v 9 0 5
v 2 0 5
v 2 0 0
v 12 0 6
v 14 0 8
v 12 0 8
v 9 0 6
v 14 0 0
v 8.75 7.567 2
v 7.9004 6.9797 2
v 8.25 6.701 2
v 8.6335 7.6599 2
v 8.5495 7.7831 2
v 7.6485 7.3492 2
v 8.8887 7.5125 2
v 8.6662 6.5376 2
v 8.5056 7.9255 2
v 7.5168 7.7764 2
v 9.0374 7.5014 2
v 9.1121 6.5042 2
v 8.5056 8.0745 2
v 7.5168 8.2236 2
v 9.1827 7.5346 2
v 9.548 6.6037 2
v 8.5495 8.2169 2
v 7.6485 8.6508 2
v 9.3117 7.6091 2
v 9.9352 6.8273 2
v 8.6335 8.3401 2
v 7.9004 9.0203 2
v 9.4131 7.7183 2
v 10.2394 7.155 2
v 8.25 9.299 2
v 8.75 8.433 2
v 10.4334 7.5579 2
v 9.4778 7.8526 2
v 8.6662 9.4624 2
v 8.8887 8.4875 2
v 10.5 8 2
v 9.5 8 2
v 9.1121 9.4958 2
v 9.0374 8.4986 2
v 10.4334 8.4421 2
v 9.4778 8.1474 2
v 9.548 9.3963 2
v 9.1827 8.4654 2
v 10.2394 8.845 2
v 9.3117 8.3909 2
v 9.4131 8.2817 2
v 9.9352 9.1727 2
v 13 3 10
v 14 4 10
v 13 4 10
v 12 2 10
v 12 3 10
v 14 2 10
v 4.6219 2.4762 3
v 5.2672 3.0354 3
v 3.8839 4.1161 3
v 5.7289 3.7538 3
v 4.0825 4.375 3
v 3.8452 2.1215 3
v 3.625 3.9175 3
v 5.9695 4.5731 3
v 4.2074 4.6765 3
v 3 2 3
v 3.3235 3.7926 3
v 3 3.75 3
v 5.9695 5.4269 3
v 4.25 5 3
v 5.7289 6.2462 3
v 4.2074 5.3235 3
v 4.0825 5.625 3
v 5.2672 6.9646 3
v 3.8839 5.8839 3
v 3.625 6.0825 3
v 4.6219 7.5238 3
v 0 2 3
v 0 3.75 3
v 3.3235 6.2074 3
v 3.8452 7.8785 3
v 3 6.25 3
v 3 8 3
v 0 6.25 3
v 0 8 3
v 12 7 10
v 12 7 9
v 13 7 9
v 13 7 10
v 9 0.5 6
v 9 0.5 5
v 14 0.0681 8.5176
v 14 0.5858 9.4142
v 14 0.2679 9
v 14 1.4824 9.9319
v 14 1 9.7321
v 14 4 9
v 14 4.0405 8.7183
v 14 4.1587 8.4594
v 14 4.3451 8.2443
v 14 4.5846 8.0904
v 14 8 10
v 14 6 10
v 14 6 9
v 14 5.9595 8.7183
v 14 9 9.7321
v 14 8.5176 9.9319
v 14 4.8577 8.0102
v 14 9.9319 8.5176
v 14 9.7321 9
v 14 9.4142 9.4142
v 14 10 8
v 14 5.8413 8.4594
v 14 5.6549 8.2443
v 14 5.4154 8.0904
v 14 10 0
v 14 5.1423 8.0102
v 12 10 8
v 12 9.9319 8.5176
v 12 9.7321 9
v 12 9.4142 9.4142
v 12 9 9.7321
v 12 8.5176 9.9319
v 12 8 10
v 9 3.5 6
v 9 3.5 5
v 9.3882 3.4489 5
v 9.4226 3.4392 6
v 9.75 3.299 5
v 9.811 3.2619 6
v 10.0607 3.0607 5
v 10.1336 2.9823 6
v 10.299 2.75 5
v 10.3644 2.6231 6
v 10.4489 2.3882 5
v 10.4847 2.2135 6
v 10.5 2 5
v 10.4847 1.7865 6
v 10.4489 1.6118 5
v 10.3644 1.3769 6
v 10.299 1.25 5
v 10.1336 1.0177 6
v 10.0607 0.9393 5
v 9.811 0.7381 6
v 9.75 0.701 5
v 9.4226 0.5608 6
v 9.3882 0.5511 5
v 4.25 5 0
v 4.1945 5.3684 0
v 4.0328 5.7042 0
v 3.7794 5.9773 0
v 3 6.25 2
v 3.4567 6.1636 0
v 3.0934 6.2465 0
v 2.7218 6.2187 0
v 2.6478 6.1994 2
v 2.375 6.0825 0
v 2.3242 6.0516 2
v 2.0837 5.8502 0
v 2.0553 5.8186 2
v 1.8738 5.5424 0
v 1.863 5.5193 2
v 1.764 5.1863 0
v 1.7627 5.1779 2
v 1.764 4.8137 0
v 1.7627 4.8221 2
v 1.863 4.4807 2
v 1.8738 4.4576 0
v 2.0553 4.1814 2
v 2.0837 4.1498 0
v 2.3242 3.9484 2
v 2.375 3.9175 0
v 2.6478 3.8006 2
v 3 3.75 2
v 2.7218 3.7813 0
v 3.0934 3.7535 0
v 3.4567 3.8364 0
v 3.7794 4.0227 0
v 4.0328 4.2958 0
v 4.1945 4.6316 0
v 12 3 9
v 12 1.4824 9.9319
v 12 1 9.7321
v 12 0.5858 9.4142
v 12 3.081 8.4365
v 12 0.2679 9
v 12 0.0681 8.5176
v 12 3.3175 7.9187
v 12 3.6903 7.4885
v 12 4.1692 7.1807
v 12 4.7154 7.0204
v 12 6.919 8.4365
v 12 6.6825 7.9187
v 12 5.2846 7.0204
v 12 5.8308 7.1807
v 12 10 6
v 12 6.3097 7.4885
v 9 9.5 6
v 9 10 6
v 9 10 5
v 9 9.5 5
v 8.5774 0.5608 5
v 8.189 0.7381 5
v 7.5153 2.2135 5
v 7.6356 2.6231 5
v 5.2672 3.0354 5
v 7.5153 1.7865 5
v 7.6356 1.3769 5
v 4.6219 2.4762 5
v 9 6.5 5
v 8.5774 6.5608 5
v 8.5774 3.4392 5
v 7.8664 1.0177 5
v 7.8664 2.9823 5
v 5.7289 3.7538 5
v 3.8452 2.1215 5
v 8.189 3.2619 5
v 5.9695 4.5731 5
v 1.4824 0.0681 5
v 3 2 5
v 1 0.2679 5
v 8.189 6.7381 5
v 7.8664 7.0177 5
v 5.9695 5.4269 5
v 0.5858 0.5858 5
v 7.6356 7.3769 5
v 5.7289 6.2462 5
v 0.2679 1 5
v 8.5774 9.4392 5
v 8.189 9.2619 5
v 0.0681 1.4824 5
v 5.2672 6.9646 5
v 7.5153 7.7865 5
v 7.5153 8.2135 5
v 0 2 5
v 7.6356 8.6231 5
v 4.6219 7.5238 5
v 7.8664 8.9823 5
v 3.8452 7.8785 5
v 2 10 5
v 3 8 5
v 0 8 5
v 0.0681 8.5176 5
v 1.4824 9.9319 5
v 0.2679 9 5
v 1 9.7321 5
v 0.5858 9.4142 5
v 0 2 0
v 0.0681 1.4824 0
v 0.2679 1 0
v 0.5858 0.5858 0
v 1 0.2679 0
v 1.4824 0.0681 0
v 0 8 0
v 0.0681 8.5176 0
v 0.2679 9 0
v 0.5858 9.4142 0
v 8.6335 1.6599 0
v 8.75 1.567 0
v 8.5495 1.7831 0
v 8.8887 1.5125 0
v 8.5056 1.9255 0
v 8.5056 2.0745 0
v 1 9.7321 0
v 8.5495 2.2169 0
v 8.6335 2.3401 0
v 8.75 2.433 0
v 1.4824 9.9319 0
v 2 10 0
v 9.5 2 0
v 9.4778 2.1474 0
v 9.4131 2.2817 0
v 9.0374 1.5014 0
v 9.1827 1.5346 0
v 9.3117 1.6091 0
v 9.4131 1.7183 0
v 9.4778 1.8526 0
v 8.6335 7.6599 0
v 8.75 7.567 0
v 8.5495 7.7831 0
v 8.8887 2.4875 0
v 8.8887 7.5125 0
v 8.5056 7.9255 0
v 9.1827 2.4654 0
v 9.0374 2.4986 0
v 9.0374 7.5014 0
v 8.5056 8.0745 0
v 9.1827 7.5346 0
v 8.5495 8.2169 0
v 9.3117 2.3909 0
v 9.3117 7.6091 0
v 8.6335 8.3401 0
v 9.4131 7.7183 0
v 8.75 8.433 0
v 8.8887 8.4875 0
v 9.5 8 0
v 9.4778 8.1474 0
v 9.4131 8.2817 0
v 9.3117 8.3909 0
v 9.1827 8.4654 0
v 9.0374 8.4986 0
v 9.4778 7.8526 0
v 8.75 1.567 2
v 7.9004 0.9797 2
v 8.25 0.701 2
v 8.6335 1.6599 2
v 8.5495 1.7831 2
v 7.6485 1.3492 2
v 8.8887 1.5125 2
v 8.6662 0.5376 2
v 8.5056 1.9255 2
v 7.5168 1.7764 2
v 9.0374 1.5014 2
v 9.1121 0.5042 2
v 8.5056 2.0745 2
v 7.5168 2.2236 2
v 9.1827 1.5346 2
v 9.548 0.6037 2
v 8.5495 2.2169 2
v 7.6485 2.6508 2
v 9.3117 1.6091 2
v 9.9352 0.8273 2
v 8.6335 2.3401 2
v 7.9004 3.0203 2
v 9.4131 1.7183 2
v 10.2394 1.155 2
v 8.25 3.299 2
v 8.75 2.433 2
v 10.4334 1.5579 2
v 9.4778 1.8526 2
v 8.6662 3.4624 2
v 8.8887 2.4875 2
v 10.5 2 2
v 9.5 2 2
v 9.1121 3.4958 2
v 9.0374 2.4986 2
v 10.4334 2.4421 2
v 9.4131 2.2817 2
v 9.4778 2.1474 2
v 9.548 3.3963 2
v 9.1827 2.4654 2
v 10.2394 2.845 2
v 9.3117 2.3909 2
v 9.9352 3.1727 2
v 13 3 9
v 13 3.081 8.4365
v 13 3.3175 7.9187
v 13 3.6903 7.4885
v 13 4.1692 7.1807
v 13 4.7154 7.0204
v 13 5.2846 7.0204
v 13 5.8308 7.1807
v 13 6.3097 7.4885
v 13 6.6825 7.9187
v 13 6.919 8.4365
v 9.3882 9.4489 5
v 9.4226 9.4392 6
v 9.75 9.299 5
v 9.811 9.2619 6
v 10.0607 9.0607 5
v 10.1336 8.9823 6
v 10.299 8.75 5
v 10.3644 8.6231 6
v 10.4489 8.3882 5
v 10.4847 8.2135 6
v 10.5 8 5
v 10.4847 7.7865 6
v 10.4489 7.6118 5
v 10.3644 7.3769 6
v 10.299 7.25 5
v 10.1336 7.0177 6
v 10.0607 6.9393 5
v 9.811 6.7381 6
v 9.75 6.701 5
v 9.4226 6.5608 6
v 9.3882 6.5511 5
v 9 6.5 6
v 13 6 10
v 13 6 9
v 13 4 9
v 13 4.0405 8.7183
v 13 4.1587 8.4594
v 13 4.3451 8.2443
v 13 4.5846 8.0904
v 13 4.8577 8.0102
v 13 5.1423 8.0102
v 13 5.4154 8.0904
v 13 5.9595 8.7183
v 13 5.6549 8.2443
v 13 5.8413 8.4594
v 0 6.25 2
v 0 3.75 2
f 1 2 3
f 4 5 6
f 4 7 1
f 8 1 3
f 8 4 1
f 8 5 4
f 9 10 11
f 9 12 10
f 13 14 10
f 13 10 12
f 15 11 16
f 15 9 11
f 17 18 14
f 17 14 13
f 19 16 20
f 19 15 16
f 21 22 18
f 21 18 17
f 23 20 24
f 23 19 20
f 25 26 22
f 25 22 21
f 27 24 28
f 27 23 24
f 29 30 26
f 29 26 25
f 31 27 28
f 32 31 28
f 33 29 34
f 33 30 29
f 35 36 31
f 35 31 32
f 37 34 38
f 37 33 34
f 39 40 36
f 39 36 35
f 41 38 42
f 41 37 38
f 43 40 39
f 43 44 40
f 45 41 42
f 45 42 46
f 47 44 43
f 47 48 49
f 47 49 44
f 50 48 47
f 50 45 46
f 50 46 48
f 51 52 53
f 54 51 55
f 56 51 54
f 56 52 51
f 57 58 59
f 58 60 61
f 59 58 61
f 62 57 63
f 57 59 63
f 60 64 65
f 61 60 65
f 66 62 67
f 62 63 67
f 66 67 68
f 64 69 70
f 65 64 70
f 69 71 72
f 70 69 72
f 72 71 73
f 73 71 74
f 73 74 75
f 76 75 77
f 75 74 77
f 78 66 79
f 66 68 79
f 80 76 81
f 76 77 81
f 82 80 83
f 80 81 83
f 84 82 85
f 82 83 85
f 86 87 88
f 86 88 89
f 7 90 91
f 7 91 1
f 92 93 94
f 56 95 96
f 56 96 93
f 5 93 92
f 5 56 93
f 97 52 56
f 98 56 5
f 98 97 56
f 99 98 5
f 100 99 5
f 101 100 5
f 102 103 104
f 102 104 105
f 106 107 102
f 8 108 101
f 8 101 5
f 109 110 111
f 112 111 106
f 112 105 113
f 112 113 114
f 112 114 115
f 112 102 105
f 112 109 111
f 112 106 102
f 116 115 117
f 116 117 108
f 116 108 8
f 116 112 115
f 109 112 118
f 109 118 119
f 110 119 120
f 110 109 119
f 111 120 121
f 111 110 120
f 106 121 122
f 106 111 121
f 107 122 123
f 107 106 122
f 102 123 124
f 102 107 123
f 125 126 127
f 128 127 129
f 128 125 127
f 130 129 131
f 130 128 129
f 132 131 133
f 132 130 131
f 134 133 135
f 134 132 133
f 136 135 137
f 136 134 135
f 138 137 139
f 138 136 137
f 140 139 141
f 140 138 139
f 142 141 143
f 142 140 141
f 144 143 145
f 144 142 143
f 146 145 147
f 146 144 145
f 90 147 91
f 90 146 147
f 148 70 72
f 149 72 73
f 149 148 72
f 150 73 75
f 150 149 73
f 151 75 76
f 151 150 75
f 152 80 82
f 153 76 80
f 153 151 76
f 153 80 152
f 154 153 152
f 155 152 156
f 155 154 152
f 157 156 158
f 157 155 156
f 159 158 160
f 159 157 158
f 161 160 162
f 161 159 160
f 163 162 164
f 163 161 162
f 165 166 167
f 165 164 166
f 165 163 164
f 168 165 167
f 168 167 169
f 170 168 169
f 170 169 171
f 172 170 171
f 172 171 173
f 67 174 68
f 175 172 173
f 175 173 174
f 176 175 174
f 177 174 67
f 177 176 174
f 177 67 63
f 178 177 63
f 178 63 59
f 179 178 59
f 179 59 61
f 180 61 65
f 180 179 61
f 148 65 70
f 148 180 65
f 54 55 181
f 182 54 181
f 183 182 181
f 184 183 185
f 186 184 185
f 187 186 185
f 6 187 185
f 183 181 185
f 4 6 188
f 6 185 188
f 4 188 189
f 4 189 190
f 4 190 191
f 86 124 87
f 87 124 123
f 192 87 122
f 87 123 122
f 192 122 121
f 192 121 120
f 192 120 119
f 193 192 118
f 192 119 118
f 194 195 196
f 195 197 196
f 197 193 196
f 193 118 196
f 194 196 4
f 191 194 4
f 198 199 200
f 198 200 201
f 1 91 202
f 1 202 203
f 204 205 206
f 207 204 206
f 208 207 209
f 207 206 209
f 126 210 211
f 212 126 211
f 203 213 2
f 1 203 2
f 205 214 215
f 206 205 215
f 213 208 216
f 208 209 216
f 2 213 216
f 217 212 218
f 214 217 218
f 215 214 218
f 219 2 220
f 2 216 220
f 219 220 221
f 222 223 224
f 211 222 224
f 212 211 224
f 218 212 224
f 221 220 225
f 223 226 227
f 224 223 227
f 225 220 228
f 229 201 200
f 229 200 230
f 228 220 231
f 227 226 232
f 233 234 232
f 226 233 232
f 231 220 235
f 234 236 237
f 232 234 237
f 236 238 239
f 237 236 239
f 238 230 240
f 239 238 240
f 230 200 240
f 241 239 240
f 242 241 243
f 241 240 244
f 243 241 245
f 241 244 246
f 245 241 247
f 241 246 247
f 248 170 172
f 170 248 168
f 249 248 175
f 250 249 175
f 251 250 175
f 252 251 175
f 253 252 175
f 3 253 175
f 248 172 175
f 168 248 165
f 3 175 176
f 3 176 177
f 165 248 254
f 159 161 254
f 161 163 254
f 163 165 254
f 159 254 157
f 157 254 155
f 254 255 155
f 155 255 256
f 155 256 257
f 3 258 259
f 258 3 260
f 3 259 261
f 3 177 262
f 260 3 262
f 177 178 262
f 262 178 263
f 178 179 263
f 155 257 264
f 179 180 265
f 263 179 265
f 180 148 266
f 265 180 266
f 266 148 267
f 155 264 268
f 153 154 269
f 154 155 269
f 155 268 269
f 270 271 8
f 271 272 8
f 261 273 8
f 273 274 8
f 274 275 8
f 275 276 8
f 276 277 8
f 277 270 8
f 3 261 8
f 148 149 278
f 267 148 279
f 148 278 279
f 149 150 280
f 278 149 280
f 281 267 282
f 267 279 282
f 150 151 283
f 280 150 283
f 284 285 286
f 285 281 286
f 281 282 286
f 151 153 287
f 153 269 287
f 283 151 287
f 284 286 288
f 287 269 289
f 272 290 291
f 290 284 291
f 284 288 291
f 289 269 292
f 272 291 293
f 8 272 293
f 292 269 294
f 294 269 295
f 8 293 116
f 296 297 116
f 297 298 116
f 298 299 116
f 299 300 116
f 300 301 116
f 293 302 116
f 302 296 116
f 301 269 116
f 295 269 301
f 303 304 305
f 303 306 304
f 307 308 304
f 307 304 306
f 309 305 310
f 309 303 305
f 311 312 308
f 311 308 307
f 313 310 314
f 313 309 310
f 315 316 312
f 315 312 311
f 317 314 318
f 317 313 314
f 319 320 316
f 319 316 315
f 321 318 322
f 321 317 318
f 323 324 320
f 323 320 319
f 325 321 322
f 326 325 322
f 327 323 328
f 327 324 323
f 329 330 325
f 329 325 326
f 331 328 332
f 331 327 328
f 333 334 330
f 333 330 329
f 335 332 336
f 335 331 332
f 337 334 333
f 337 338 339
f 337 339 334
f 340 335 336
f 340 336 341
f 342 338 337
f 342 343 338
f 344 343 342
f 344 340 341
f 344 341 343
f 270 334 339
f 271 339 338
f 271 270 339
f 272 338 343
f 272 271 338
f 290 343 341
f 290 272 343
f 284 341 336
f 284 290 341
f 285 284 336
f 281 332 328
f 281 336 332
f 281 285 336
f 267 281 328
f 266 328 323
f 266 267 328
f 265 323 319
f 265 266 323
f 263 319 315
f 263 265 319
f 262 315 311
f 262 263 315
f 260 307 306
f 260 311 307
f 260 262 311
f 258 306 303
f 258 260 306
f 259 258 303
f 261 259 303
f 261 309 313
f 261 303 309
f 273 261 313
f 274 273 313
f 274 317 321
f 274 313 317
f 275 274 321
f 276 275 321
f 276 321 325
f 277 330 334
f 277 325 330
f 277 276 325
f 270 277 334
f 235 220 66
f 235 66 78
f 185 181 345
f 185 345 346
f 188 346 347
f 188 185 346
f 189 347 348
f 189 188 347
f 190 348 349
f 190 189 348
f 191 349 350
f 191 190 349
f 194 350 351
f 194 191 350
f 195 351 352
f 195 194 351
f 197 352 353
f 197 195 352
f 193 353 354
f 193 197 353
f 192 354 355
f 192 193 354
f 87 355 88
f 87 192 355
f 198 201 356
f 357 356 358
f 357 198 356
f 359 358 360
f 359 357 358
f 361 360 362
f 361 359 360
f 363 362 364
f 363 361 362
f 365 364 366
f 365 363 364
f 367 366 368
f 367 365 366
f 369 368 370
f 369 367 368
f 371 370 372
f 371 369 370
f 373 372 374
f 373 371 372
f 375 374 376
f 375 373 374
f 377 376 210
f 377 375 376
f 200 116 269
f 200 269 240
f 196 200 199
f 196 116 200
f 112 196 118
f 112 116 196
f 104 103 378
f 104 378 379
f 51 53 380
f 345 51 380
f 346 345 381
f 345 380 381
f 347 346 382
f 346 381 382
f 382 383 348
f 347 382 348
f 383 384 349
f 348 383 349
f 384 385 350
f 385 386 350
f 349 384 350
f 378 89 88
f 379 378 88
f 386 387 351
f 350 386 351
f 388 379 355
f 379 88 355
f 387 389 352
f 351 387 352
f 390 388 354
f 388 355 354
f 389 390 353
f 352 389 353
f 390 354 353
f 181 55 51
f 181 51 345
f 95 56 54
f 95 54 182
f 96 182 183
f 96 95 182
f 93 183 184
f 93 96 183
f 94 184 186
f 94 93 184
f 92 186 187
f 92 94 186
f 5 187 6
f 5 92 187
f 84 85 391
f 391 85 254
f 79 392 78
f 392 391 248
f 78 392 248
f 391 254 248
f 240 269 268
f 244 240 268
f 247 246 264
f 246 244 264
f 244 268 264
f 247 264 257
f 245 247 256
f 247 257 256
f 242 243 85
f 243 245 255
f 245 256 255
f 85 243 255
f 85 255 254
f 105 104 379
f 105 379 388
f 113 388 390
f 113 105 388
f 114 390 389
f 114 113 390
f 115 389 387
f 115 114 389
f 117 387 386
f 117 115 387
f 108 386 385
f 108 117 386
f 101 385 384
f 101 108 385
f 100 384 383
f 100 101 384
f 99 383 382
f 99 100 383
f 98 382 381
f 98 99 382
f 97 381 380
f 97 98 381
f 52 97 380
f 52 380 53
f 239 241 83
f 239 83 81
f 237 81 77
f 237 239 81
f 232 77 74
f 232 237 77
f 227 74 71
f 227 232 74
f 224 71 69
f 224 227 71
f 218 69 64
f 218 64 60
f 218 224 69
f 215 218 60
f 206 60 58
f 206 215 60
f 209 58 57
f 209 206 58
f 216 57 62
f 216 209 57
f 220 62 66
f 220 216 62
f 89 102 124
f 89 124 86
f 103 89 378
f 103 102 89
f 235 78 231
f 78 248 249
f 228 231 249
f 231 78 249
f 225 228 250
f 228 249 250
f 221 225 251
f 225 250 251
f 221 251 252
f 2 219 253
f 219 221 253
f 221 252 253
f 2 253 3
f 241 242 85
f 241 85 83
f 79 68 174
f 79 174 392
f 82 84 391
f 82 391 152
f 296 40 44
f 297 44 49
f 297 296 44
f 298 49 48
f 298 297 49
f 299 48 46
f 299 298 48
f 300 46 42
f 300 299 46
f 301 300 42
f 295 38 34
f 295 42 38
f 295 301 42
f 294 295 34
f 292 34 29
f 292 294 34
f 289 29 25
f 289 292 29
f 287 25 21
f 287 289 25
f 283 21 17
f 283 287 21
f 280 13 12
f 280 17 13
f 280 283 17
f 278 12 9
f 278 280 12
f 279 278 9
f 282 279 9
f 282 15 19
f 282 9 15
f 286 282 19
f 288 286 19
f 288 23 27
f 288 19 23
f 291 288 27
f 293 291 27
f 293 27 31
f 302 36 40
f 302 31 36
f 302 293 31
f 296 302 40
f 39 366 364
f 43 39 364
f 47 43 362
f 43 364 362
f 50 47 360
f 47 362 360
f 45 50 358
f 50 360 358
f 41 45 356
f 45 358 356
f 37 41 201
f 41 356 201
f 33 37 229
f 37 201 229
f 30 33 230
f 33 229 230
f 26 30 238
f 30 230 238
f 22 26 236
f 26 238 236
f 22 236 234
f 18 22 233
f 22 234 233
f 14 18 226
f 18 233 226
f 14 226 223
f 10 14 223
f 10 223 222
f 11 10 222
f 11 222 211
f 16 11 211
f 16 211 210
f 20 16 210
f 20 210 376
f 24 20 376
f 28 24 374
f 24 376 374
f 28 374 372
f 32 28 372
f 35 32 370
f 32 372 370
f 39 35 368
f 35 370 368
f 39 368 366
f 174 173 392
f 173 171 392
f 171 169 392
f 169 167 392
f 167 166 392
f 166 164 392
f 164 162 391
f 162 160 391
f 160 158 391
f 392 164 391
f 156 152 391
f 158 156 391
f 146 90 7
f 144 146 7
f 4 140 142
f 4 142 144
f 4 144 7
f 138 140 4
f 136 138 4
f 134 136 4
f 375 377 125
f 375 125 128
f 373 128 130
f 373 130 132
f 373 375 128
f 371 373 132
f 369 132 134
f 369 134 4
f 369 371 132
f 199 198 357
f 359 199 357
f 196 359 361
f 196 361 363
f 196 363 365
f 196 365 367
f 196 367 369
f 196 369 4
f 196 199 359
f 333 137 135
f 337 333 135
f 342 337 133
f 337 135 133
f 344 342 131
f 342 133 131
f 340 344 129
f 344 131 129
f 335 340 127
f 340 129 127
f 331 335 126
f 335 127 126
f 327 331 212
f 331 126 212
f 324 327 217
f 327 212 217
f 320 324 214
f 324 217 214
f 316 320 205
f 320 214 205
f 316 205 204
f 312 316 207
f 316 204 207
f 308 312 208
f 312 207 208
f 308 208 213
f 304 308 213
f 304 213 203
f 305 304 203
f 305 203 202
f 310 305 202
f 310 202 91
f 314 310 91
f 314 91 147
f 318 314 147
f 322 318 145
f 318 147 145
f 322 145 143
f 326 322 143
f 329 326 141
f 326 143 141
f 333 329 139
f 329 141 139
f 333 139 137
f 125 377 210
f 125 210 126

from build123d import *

# Parameters (mm, degrees)
SKETCH1_R           = 1.25
SKETCH1_R_2         = 0.5
BOSS_EXTRUDE1_DEPTH = 6
BOSS_EXTRUDE2_DEPTH = 2
CUT_EXTRUDE1_DEPTH  = 1
CUT_EXTRUDE2_DEPTH  = 1
CUT_EXTRUDE3_DEPTH  = 2
CUT_EXTRUDE4_DEPTH  = 1
SKETCH9_R           = 1.5
CUT_EXTRUDE5_DEPTH  = 3


with BuildPart() as part:
    # Sketch1 → Boss-Extrude1 (new body)
    with BuildSketch(Plane.XY):
        with BuildLine():
            Line((2, 0), (14, 0))
            Line((14, 0), (14, 10))
            Line((14, 10), (2, 10))
            ThreePointArc((2, 10), (0.585786438, 9.414213562), (0, 8))
            Line((0, 8), (0, 2))
            ThreePointArc((0, 2), (0.585786438, 0.585786438), (2, 0))
        make_face()
        with Locations((3, 5)):
            Circle(SKETCH1_R, mode=Mode.SUBTRACT)
        with Locations((9, 8)):
            Circle(SKETCH1_R_2, mode=Mode.SUBTRACT)
        with Locations((9, 2)):
            Circle(SKETCH1_R_2, mode=Mode.SUBTRACT)
    extrude(amount=BOSS_EXTRUDE1_DEPTH)

    # Sketch2 → Boss-Extrude2 (add)
    with BuildSketch(Plane(origin=(14, 0, 0), x_dir=(0, 0, -1), z_dir=(1, 0, 0))):
        with BuildLine():
            Line((-6, 0), (-6, 10))
            Line((-6, 10), (-8, 10))
            ThreePointArc((-8, 10), (-9.414213562, 9.414213562), (-10, 8))
            Line((-10, 8), (-10, 7))
            Line((-10, 7), (-9, 7))
            ThreePointArc((-9, 7), (-7, 5), (-9, 3))
            Line((-9, 3), (-10, 3))
            Line((-10, 3), (-10, 2))
            ThreePointArc((-10, 2), (-9.414213562, 0.585786438), (-8, 0))
            Line((-8, 0), (-6, 0))
        make_face()
        with BuildLine():
            Line((-9, 7), (-10, 7))
            Line((-10, 7), (-10, 6))
            Line((-10, 6), (-9, 6))
            ThreePointArc((-9, 6), (-8, 5), (-9, 4))
            Line((-9, 4), (-10, 4))
            Line((-10, 4), (-10, 3))
            Line((-10, 3), (-9, 3))
            ThreePointArc((-9, 3), (-7, 5), (-9, 7))
        make_face()
    extrude(amount=-BOSS_EXTRUDE2_DEPTH)

    # Sketch5 → Cut-Extrude1 (cut)
    with BuildSketch(Plane.ZY.offset(-12)):
        with BuildLine():
            Line((9, 7), (11.167948086, 7))
            ThreePointArc((11.167948086, 7), (13.167948086, 5), (11.167948086, 3))
            Line((11.167948086, 3), (9, 3))
            ThreePointArc((9, 3), (7, 5), (9, 7))
        make_face()
    extrude(amount=-CUT_EXTRUDE1_DEPTH, mode=Mode.SUBTRACT)

    # Sketch6 → Cut-Extrude2 (cut)
    with BuildSketch(Plane.XY.offset(6)):
        with BuildLine():
            Line((9, 10.115579993), (9, 9.5))
            ThreePointArc((9, 9.5), (10.5, 8), (9, 6.5))
            Line((9, 6.5), (9, 3.5))
            ThreePointArc((9, 3.5), (10.5, 2), (9, 0.5))
            Line((9, 0.5), (9, -0.336498004))
            Line((9, -0.336498004), (-3.111242448, -0.336498004))
            Line((-3.111242448, -0.336498004), (-3.111242448, 10.115579993))
            Line((-3.111242448, 10.115579993), (9, 10.115579993))
        make_face()
    extrude(amount=-CUT_EXTRUDE2_DEPTH, mode=Mode.SUBTRACT)

    # Sketch7 → Cut-Extrude3 (cut)
    with BuildSketch(Plane.XY.offset(5)):
        with BuildLine():
            Line((3, 2), (-3.248762224, 2))
            ThreePointArc((-3.248762224, 2), (-6.248762224, 5), (-3.248762224, 8))
            Line((-3.248762224, 8), (3, 8))
            ThreePointArc((3, 8), (6, 5), (3, 2))
        make_face()
    extrude(amount=-CUT_EXTRUDE3_DEPTH, mode=Mode.SUBTRACT)

    # Sketch8 → Cut-Extrude4 (cut)
    with BuildSketch(Plane.XY.offset(3)):
        with BuildLine():
            Line((3, 3.75), (-1.562441064, 3.75))
            ThreePointArc((-1.562441064, 3.75), (-2.812441064, 5), (-1.562441064, 6.25))
            Line((-1.562441064, 6.25), (3, 6.25))
            ThreePointArc((3, 6.25), (4.25, 5), (3, 3.75))
        make_face()
    extrude(amount=-CUT_EXTRUDE4_DEPTH, mode=Mode.SUBTRACT)

    # Sketch9 → Cut-Extrude5 (cut)
    with BuildSketch(Plane.XY.offset(5)):
        with Locations((9, 8)):
            Circle(SKETCH9_R)
        with Locations((9, 2)):
            Circle(SKETCH9_R)
    extrude(amount=-CUT_EXTRUDE5_DEPTH, mode=Mode.SUBTRACT)


solid = part.part
